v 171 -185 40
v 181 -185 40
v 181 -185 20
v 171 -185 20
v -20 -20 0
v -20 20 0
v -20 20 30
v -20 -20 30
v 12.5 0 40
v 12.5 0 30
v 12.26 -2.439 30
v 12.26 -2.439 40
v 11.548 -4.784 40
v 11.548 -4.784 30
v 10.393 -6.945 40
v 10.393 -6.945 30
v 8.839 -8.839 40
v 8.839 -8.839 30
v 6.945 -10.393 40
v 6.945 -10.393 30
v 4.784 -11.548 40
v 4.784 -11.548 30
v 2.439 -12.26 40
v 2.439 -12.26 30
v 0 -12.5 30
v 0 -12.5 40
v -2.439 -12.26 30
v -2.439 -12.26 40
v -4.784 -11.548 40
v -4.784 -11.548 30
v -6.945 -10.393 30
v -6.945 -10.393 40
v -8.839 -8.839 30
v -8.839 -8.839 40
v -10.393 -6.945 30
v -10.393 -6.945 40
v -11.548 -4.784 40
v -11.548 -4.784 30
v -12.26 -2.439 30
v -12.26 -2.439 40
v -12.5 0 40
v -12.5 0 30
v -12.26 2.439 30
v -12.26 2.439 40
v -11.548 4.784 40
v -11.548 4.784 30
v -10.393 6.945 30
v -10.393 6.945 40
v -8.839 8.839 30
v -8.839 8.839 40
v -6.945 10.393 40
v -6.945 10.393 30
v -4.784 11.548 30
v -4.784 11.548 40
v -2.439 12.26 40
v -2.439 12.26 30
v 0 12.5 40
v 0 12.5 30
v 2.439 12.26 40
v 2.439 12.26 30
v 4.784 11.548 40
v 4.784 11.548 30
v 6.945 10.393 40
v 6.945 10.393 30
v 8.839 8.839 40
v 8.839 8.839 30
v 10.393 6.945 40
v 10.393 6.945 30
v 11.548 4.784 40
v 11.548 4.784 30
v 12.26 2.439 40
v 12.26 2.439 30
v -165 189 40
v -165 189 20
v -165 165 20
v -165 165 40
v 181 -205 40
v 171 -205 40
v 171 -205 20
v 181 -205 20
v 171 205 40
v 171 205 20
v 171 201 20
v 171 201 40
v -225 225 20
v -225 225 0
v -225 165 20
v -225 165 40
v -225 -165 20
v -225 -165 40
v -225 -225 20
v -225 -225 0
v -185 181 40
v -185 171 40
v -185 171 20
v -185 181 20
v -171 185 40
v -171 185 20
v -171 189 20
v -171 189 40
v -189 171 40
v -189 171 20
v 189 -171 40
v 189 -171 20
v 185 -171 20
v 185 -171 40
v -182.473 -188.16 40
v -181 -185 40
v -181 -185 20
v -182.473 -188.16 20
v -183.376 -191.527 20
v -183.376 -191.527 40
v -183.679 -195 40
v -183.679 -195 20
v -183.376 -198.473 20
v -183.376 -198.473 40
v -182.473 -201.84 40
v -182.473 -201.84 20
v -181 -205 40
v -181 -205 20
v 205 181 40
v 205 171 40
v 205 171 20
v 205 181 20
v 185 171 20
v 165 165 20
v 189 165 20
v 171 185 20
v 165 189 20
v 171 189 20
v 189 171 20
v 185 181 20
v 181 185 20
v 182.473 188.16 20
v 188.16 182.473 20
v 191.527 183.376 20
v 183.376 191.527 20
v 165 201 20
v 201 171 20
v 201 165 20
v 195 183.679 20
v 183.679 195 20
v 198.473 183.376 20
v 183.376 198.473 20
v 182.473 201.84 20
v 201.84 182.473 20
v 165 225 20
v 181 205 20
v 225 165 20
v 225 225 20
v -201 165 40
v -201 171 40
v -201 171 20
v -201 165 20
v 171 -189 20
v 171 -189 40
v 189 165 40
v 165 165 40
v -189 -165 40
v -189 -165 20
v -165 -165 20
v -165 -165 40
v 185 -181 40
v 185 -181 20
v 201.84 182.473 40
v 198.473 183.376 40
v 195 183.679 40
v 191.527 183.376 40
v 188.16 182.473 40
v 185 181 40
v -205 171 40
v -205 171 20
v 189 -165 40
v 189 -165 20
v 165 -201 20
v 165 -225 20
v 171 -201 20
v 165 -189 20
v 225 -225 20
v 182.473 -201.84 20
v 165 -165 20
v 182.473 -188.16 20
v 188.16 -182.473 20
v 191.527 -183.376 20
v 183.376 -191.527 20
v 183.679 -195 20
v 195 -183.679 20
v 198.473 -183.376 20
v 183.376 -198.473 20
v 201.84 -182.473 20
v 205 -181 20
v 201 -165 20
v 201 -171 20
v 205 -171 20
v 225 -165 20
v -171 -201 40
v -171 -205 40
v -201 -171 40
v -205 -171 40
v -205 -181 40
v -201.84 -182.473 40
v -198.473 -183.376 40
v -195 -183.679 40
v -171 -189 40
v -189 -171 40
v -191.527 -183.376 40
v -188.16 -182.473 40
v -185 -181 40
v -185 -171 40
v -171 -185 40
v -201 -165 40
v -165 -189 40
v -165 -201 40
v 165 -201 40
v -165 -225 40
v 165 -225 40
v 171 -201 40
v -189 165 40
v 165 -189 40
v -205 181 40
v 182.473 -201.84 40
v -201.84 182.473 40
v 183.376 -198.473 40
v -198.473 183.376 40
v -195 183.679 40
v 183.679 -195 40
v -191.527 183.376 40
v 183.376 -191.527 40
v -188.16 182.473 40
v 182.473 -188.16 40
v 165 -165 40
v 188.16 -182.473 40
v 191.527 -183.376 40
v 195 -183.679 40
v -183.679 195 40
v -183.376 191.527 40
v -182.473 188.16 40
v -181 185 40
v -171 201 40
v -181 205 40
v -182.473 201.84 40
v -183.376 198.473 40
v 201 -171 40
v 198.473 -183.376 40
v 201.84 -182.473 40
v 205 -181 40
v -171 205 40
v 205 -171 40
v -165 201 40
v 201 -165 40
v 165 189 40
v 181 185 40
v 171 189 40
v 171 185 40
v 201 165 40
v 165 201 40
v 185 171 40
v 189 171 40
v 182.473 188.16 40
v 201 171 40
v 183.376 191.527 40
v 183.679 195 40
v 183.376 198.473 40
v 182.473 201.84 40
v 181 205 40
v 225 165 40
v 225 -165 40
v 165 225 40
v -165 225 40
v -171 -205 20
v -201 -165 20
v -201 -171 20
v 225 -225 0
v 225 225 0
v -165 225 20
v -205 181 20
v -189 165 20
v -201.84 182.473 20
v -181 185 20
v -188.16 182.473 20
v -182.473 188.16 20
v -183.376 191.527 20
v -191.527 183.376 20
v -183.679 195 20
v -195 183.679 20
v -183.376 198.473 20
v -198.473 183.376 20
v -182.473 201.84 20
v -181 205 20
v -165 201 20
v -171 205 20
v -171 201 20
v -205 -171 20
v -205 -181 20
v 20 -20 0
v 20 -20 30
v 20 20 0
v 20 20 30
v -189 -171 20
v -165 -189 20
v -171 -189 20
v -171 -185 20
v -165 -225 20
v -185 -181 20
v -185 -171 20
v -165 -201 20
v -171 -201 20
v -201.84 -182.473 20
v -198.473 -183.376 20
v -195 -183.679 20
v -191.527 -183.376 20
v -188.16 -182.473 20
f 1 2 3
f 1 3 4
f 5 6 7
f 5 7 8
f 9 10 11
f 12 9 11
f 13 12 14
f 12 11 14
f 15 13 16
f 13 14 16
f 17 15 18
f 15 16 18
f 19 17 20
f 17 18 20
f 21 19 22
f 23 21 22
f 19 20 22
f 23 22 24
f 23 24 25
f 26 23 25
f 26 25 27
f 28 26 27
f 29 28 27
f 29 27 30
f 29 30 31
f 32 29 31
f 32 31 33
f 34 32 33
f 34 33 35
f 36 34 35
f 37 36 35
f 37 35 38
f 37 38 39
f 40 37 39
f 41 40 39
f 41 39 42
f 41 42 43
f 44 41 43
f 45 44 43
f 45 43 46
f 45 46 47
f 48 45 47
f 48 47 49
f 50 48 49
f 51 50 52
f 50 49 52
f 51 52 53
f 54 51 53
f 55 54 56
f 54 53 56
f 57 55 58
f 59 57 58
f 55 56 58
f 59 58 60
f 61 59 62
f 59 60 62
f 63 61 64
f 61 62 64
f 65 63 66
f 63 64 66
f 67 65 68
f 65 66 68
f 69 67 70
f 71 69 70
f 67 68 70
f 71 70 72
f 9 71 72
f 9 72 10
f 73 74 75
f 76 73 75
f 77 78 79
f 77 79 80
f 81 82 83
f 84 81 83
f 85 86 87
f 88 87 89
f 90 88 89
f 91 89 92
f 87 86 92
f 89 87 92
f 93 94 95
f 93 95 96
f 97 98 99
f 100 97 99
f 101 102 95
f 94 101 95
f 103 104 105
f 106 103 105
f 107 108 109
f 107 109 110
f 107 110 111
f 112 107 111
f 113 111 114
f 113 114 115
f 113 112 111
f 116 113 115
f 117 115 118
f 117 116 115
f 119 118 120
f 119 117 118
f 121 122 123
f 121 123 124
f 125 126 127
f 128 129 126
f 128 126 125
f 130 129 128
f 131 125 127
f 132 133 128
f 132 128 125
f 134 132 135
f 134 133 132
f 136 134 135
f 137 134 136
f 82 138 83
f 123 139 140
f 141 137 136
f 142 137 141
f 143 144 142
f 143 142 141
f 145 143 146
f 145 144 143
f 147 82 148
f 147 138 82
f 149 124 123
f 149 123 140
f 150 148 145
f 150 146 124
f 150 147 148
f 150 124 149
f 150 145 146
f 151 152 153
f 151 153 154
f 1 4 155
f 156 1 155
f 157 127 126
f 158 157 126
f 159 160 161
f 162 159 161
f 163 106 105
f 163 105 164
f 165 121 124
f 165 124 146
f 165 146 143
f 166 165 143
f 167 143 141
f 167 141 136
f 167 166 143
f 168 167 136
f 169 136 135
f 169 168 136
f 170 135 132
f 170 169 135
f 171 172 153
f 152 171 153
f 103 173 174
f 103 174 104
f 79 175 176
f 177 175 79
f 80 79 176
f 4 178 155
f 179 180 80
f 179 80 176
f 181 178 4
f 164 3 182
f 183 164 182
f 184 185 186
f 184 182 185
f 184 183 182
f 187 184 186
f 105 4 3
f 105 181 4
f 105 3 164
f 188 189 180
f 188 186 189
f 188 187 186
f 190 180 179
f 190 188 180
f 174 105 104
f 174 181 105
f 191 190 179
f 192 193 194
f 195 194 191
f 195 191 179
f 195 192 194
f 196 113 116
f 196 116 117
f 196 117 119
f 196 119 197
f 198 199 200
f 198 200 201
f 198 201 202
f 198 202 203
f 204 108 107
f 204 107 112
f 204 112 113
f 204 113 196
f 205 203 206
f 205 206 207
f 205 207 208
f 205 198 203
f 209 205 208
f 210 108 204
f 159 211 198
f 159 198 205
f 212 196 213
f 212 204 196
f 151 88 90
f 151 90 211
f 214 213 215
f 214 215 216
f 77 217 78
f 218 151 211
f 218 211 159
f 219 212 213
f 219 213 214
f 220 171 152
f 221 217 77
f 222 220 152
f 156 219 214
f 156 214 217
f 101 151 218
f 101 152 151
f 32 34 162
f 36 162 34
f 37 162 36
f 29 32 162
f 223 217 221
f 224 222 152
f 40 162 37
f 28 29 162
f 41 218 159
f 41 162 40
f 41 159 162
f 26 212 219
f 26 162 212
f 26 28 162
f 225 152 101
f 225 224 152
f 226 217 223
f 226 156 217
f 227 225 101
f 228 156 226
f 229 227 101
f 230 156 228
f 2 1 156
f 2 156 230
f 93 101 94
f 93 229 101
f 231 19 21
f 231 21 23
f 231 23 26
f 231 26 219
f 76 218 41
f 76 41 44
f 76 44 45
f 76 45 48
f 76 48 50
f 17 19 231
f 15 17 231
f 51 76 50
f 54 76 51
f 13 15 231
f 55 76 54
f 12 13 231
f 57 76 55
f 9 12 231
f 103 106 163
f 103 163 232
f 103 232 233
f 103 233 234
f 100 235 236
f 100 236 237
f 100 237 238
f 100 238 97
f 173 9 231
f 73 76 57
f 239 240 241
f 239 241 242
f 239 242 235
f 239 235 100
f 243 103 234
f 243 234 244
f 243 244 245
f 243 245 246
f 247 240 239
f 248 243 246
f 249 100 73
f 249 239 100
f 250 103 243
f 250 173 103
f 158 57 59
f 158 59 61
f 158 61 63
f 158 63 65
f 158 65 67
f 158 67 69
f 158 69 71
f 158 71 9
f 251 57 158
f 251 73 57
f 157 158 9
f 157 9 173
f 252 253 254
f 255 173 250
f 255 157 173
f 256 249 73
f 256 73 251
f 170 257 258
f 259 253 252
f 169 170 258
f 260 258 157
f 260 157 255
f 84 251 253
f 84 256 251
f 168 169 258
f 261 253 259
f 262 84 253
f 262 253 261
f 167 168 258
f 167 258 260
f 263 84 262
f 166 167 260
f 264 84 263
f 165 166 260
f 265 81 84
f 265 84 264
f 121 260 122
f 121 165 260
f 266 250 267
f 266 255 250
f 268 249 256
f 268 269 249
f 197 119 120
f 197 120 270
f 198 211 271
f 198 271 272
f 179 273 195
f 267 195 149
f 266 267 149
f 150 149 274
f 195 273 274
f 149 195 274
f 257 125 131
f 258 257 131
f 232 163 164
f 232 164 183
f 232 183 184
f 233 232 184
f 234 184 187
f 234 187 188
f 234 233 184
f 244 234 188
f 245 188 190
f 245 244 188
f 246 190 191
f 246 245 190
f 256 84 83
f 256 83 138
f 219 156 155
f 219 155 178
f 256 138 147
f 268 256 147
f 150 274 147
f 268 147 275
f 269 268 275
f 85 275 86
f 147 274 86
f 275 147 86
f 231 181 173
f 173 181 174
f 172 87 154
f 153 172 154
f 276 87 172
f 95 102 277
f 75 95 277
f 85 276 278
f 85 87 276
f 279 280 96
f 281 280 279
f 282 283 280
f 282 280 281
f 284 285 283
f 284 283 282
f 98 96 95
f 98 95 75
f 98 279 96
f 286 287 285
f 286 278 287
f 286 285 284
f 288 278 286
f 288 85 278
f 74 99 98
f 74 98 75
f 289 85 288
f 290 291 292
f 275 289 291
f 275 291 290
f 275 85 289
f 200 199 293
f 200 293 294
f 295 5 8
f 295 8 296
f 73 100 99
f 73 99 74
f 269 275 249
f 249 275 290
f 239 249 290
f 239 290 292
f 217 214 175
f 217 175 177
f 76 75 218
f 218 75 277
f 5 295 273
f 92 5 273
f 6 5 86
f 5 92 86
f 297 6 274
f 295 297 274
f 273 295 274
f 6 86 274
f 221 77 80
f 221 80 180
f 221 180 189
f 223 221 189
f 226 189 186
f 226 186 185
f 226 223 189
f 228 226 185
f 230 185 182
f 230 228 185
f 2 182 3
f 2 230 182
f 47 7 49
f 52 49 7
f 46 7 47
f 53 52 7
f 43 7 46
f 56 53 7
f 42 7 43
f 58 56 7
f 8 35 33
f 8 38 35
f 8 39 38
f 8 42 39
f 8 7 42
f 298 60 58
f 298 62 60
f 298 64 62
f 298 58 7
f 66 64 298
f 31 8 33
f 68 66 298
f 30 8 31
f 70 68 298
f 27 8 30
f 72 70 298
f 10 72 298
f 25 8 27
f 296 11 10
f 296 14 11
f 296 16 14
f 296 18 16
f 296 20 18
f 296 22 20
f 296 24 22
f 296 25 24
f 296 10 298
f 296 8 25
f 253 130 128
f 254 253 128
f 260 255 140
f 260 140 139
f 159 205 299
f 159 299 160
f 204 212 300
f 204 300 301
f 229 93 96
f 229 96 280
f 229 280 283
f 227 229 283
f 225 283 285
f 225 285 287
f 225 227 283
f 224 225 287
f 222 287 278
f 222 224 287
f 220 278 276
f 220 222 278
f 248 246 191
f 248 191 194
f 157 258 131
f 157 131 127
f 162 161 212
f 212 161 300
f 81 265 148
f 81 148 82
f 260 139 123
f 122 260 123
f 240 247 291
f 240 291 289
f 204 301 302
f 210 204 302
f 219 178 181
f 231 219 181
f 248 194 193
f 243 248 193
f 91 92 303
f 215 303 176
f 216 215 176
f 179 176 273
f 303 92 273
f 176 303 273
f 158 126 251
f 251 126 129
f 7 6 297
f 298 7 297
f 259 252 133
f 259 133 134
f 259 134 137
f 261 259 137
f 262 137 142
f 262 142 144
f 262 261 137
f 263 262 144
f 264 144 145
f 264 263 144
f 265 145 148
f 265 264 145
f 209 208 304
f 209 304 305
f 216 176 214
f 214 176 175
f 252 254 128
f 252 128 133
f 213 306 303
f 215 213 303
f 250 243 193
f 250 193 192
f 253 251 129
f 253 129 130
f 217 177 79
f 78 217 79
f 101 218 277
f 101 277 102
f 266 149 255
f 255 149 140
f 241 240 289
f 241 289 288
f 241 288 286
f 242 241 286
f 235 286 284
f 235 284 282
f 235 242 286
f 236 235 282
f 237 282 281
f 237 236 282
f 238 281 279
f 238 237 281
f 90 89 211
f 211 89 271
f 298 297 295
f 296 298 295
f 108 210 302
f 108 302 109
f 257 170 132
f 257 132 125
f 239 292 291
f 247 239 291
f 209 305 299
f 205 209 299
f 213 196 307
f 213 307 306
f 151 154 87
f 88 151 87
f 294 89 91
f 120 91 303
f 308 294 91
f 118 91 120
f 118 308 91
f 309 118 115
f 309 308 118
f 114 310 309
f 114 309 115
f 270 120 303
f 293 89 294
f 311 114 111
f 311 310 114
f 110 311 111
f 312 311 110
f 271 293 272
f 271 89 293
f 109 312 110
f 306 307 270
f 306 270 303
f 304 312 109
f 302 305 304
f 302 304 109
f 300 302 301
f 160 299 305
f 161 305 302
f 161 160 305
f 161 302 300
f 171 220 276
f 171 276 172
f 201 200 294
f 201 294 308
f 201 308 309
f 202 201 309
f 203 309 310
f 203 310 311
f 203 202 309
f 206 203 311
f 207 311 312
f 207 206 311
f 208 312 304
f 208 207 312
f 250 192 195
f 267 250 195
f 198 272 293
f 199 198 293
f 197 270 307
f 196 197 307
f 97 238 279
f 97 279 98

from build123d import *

# Parameters (mm, degrees)
F1_DEPTH  = 40
F0_W      = 60
F0_H      = 60
F3_DEPTH  = 20
F5_DEPTH  = 20
F6_W      = 40
F6_H      = 40
F6_R      = 12.5
F7_DEPTH  = 30
F7_FACE_R = 12.5
F8_DEPTH  = 40


with BuildPart() as f1:
    # F0 (on Top) → F1 (new body)
    with BuildSketch(Plane.XY):
        Polygon((165, 165), (165, 225), (-165, 225), (-165, 165), (-225, 165), (-225, -165), (-165, -165), (-165, -225), (165, -225), (165, -165), (225, -165), (225, 165), align=None)
    extrude(amount=F1_DEPTH)

    # F0 (on Top) → F3 (join)
    with BuildSketch(Plane.XY):
        with Locations((195, 195)):
            Rectangle(F0_W, F0_H)
        Polygon((165, 165), (165, 225), (-165, 225), (-165, 165), (-225, 165), (-225, -165), (-165, -165), (-165, -225), (165, -225), (165, -165), (225, -165), (225, 165), align=None)
        with Locations((-195, 195)):
            Rectangle(F0_W, F0_H)
        with Locations((195, -195)):
            Rectangle(F0_W, F0_H)
        with Locations((-195, -195)):
            Rectangle(F0_W, F0_H)
    extrude(amount=F3_DEPTH)

    # F4 (on face) → F5 (join, through all)
    with BuildSketch(Plane.XY.offset(40)):
        with BuildLine():
            Line((-201, 171), (-201, 165))
            Line((-201, 165), (-189, 165))
            Line((-189, 165), (-189, 171))
            Line((-189, 171), (-185, 171))
            Line((-185, 171), (-185, 181))
            ThreePointArc((-185, 181), (-195, 183.679492), (-205, 181))
            Line((-205, 181), (-205, 171))
            Line((-205, 171), (-201, 171))
        make_face()
        with BuildLine():
            Line((-171, 189), (-165, 189))
            Line((-165, 189), (-165, 201))
            Line((-165, 201), (-171, 201))
            Line((-171, 201), (-171, 205))
            Line((-171, 205), (-181, 205))
            ThreePointArc((-181, 205), (-183.679492, 195), (-181, 185))
            Line((-181, 185), (-171, 185))
            Line((-171, 185), (-171, 189))
        make_face()
        with BuildLine():
            Line((181, 205), (171, 205))
            Line((171, 205), (171, 201))
            Line((171, 201), (165, 201))
            Line((165, 201), (165, 189))
            Line((165, 189), (171, 189))
            Line((171, 189), (171, 185))
            Line((171, 185), (181, 185))
            ThreePointArc((181, 185), (183.679492, 195), (181, 205))
        make_face()
        with BuildLine():
            Line((185, 181), (185, 171))
            Line((185, 171), (189, 171))
            Line((189, 171), (189, 165))
            Line((189, 165), (201, 165))
            Line((201, 165), (201, 171))
            Line((201, 171), (205, 171))
            Line((205, 171), (205, 181))
            ThreePointArc((205, 181), (195, 183.679492), (185, 181))
        make_face()
        with BuildLine():
            Line((-181, -205), (-171, -205))
            Line((-171, -205), (-171, -201))
            Line((-171, -201), (-165, -201))
            Line((-165, -201), (-165, -189))
            Line((-165, -189), (-171, -189))
            Line((-171, -189), (-171, -185))
            Line((-171, -185), (-181, -185))
            ThreePointArc((-181, -185), (-183.679492, -195), (-181, -205))
        make_face()
        with BuildLine():
            Line((-185, -181), (-185, -171))
            Line((-185, -171), (-189, -171))
            Line((-189, -171), (-189, -165))
            Line((-189, -165), (-201, -165))
            Line((-201, -165), (-201, -171))
            Line((-201, -171), (-205, -171))
            Line((-205, -171), (-205, -181))
            ThreePointArc((-205, -181), (-195, -183.679492), (-185, -181))
        make_face()
        with BuildLine():
            Line((205, -181), (205, -171))
            Line((205, -171), (201, -171))
            Line((201, -171), (201, -165))
            Line((201, -165), (189, -165))
            Line((189, -165), (189, -171))
            Line((189, -171), (185, -171))
            Line((185, -171), (185, -181))
            ThreePointArc((185, -181), (195, -183.679492), (205, -181))
        make_face()
        with BuildLine():
            Line((181, -185), (171, -185))
            Line((171, -185), (171, -189))
            Line((171, -189), (165, -189))
            Line((165, -189), (165, -201))
            Line((165, -201), (171, -201))
            Line((171, -201), (171, -205))
            Line((171, -205), (181, -205))
            ThreePointArc((181, -205), (183.679492, -195), (181, -185))
        make_face()
    extrude(amount=-F5_DEPTH)

    # F6 (on face) → F7 (cut)
    with BuildSketch(Plane(origin=(0, 0, 0), x_dir=(1, 0, 0), z_dir=(0, 0, -1))):
        Rectangle(F6_W, F6_H)
        Circle(F6_R, mode=Mode.SUBTRACT)
    extrude(amount=-F7_DEPTH, mode=Mode.SUBTRACT)

    # F7_face (on face) → F8 (cut, through all)
    with BuildSketch(Plane(origin=(0, 0, 0), x_dir=(1, 0, 0), z_dir=(0, 0, -1))):
        Circle(F7_FACE_R)
    extrude(amount=-F8_DEPTH, mode=Mode.SUBTRACT)


solid = f1.part
